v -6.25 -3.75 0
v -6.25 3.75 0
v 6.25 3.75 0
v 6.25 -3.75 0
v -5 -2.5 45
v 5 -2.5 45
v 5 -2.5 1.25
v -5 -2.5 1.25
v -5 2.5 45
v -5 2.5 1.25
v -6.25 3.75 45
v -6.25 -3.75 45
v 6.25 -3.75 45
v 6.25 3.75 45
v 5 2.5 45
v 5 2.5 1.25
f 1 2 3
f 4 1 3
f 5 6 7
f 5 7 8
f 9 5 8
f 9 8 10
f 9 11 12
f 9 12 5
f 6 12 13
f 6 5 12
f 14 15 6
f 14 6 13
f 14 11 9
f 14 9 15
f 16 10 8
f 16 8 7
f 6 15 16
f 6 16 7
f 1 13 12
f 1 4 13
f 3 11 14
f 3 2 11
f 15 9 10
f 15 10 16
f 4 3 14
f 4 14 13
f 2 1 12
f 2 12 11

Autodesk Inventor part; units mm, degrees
ref_plane "YZ Plane" through (0, 0, 0) normal (1, 0, 0) x (0, 1, 0)
ref_plane "XZ Plane" through (0, 0, 0) normal (0, 1, 0) x (-1, 0, 0)
ref_plane "XY Plane" through (0, 0, 0) normal (0, 0, 1) x (1, 0, 0)
sketch "Sketch1" plane through (0, 0, 0) normal (0, 0, 1) x (1, 0, 0)
  line L0 (0, 5.25) -> (0, -5.25) construction
  line L1 (-8.75, 0) -> (8.75, 0) construction
  line L2 (-6.25, 3.75) -> (6.25, 3.75)
  line L3 (6.25, 3.75) -> (6.25, -3.75)
  line L4 (6.25, -3.75) -> (-6.25, -3.75)
  line L5 (-6.25, -3.75) -> (-6.25, 3.75)
  point P0 (0, 0)
  dimension "d0" = 7.5
  dimension "d1" = 12.5
extrude "Extrusion1" add sketch "Sketch1" along normal blind 45
sketch "Sketch2" plane through (0, 0, 45) normal (0, 0, 1) x (1, 0, 0)
  line L0 (-6.25, 3.75) -> (6.25, 3.75) projected
  line L1 (-6.25, -3.75) -> (-6.25, 3.75) projected
  line L2 (-5, 2.5) -> (5, 2.5)
  line L3 (5, 2.5) -> (5, -2.5)
  line L4 (5, -2.5) -> (-5, -2.5)
  line L5 (-5, -2.5) -> (-5, 2.5)
  point P0 (0, 0)
  dimension "d4" = 10
  dimension "d5" = 5
  dimension "d6" = 1.25
  dimension "d7" = 1.25
extrude "Extrusion2" cut sketch "Sketch2" against normal blind 43.75
properties part number "UQ-203-5x10x45mm" material "Glass"
